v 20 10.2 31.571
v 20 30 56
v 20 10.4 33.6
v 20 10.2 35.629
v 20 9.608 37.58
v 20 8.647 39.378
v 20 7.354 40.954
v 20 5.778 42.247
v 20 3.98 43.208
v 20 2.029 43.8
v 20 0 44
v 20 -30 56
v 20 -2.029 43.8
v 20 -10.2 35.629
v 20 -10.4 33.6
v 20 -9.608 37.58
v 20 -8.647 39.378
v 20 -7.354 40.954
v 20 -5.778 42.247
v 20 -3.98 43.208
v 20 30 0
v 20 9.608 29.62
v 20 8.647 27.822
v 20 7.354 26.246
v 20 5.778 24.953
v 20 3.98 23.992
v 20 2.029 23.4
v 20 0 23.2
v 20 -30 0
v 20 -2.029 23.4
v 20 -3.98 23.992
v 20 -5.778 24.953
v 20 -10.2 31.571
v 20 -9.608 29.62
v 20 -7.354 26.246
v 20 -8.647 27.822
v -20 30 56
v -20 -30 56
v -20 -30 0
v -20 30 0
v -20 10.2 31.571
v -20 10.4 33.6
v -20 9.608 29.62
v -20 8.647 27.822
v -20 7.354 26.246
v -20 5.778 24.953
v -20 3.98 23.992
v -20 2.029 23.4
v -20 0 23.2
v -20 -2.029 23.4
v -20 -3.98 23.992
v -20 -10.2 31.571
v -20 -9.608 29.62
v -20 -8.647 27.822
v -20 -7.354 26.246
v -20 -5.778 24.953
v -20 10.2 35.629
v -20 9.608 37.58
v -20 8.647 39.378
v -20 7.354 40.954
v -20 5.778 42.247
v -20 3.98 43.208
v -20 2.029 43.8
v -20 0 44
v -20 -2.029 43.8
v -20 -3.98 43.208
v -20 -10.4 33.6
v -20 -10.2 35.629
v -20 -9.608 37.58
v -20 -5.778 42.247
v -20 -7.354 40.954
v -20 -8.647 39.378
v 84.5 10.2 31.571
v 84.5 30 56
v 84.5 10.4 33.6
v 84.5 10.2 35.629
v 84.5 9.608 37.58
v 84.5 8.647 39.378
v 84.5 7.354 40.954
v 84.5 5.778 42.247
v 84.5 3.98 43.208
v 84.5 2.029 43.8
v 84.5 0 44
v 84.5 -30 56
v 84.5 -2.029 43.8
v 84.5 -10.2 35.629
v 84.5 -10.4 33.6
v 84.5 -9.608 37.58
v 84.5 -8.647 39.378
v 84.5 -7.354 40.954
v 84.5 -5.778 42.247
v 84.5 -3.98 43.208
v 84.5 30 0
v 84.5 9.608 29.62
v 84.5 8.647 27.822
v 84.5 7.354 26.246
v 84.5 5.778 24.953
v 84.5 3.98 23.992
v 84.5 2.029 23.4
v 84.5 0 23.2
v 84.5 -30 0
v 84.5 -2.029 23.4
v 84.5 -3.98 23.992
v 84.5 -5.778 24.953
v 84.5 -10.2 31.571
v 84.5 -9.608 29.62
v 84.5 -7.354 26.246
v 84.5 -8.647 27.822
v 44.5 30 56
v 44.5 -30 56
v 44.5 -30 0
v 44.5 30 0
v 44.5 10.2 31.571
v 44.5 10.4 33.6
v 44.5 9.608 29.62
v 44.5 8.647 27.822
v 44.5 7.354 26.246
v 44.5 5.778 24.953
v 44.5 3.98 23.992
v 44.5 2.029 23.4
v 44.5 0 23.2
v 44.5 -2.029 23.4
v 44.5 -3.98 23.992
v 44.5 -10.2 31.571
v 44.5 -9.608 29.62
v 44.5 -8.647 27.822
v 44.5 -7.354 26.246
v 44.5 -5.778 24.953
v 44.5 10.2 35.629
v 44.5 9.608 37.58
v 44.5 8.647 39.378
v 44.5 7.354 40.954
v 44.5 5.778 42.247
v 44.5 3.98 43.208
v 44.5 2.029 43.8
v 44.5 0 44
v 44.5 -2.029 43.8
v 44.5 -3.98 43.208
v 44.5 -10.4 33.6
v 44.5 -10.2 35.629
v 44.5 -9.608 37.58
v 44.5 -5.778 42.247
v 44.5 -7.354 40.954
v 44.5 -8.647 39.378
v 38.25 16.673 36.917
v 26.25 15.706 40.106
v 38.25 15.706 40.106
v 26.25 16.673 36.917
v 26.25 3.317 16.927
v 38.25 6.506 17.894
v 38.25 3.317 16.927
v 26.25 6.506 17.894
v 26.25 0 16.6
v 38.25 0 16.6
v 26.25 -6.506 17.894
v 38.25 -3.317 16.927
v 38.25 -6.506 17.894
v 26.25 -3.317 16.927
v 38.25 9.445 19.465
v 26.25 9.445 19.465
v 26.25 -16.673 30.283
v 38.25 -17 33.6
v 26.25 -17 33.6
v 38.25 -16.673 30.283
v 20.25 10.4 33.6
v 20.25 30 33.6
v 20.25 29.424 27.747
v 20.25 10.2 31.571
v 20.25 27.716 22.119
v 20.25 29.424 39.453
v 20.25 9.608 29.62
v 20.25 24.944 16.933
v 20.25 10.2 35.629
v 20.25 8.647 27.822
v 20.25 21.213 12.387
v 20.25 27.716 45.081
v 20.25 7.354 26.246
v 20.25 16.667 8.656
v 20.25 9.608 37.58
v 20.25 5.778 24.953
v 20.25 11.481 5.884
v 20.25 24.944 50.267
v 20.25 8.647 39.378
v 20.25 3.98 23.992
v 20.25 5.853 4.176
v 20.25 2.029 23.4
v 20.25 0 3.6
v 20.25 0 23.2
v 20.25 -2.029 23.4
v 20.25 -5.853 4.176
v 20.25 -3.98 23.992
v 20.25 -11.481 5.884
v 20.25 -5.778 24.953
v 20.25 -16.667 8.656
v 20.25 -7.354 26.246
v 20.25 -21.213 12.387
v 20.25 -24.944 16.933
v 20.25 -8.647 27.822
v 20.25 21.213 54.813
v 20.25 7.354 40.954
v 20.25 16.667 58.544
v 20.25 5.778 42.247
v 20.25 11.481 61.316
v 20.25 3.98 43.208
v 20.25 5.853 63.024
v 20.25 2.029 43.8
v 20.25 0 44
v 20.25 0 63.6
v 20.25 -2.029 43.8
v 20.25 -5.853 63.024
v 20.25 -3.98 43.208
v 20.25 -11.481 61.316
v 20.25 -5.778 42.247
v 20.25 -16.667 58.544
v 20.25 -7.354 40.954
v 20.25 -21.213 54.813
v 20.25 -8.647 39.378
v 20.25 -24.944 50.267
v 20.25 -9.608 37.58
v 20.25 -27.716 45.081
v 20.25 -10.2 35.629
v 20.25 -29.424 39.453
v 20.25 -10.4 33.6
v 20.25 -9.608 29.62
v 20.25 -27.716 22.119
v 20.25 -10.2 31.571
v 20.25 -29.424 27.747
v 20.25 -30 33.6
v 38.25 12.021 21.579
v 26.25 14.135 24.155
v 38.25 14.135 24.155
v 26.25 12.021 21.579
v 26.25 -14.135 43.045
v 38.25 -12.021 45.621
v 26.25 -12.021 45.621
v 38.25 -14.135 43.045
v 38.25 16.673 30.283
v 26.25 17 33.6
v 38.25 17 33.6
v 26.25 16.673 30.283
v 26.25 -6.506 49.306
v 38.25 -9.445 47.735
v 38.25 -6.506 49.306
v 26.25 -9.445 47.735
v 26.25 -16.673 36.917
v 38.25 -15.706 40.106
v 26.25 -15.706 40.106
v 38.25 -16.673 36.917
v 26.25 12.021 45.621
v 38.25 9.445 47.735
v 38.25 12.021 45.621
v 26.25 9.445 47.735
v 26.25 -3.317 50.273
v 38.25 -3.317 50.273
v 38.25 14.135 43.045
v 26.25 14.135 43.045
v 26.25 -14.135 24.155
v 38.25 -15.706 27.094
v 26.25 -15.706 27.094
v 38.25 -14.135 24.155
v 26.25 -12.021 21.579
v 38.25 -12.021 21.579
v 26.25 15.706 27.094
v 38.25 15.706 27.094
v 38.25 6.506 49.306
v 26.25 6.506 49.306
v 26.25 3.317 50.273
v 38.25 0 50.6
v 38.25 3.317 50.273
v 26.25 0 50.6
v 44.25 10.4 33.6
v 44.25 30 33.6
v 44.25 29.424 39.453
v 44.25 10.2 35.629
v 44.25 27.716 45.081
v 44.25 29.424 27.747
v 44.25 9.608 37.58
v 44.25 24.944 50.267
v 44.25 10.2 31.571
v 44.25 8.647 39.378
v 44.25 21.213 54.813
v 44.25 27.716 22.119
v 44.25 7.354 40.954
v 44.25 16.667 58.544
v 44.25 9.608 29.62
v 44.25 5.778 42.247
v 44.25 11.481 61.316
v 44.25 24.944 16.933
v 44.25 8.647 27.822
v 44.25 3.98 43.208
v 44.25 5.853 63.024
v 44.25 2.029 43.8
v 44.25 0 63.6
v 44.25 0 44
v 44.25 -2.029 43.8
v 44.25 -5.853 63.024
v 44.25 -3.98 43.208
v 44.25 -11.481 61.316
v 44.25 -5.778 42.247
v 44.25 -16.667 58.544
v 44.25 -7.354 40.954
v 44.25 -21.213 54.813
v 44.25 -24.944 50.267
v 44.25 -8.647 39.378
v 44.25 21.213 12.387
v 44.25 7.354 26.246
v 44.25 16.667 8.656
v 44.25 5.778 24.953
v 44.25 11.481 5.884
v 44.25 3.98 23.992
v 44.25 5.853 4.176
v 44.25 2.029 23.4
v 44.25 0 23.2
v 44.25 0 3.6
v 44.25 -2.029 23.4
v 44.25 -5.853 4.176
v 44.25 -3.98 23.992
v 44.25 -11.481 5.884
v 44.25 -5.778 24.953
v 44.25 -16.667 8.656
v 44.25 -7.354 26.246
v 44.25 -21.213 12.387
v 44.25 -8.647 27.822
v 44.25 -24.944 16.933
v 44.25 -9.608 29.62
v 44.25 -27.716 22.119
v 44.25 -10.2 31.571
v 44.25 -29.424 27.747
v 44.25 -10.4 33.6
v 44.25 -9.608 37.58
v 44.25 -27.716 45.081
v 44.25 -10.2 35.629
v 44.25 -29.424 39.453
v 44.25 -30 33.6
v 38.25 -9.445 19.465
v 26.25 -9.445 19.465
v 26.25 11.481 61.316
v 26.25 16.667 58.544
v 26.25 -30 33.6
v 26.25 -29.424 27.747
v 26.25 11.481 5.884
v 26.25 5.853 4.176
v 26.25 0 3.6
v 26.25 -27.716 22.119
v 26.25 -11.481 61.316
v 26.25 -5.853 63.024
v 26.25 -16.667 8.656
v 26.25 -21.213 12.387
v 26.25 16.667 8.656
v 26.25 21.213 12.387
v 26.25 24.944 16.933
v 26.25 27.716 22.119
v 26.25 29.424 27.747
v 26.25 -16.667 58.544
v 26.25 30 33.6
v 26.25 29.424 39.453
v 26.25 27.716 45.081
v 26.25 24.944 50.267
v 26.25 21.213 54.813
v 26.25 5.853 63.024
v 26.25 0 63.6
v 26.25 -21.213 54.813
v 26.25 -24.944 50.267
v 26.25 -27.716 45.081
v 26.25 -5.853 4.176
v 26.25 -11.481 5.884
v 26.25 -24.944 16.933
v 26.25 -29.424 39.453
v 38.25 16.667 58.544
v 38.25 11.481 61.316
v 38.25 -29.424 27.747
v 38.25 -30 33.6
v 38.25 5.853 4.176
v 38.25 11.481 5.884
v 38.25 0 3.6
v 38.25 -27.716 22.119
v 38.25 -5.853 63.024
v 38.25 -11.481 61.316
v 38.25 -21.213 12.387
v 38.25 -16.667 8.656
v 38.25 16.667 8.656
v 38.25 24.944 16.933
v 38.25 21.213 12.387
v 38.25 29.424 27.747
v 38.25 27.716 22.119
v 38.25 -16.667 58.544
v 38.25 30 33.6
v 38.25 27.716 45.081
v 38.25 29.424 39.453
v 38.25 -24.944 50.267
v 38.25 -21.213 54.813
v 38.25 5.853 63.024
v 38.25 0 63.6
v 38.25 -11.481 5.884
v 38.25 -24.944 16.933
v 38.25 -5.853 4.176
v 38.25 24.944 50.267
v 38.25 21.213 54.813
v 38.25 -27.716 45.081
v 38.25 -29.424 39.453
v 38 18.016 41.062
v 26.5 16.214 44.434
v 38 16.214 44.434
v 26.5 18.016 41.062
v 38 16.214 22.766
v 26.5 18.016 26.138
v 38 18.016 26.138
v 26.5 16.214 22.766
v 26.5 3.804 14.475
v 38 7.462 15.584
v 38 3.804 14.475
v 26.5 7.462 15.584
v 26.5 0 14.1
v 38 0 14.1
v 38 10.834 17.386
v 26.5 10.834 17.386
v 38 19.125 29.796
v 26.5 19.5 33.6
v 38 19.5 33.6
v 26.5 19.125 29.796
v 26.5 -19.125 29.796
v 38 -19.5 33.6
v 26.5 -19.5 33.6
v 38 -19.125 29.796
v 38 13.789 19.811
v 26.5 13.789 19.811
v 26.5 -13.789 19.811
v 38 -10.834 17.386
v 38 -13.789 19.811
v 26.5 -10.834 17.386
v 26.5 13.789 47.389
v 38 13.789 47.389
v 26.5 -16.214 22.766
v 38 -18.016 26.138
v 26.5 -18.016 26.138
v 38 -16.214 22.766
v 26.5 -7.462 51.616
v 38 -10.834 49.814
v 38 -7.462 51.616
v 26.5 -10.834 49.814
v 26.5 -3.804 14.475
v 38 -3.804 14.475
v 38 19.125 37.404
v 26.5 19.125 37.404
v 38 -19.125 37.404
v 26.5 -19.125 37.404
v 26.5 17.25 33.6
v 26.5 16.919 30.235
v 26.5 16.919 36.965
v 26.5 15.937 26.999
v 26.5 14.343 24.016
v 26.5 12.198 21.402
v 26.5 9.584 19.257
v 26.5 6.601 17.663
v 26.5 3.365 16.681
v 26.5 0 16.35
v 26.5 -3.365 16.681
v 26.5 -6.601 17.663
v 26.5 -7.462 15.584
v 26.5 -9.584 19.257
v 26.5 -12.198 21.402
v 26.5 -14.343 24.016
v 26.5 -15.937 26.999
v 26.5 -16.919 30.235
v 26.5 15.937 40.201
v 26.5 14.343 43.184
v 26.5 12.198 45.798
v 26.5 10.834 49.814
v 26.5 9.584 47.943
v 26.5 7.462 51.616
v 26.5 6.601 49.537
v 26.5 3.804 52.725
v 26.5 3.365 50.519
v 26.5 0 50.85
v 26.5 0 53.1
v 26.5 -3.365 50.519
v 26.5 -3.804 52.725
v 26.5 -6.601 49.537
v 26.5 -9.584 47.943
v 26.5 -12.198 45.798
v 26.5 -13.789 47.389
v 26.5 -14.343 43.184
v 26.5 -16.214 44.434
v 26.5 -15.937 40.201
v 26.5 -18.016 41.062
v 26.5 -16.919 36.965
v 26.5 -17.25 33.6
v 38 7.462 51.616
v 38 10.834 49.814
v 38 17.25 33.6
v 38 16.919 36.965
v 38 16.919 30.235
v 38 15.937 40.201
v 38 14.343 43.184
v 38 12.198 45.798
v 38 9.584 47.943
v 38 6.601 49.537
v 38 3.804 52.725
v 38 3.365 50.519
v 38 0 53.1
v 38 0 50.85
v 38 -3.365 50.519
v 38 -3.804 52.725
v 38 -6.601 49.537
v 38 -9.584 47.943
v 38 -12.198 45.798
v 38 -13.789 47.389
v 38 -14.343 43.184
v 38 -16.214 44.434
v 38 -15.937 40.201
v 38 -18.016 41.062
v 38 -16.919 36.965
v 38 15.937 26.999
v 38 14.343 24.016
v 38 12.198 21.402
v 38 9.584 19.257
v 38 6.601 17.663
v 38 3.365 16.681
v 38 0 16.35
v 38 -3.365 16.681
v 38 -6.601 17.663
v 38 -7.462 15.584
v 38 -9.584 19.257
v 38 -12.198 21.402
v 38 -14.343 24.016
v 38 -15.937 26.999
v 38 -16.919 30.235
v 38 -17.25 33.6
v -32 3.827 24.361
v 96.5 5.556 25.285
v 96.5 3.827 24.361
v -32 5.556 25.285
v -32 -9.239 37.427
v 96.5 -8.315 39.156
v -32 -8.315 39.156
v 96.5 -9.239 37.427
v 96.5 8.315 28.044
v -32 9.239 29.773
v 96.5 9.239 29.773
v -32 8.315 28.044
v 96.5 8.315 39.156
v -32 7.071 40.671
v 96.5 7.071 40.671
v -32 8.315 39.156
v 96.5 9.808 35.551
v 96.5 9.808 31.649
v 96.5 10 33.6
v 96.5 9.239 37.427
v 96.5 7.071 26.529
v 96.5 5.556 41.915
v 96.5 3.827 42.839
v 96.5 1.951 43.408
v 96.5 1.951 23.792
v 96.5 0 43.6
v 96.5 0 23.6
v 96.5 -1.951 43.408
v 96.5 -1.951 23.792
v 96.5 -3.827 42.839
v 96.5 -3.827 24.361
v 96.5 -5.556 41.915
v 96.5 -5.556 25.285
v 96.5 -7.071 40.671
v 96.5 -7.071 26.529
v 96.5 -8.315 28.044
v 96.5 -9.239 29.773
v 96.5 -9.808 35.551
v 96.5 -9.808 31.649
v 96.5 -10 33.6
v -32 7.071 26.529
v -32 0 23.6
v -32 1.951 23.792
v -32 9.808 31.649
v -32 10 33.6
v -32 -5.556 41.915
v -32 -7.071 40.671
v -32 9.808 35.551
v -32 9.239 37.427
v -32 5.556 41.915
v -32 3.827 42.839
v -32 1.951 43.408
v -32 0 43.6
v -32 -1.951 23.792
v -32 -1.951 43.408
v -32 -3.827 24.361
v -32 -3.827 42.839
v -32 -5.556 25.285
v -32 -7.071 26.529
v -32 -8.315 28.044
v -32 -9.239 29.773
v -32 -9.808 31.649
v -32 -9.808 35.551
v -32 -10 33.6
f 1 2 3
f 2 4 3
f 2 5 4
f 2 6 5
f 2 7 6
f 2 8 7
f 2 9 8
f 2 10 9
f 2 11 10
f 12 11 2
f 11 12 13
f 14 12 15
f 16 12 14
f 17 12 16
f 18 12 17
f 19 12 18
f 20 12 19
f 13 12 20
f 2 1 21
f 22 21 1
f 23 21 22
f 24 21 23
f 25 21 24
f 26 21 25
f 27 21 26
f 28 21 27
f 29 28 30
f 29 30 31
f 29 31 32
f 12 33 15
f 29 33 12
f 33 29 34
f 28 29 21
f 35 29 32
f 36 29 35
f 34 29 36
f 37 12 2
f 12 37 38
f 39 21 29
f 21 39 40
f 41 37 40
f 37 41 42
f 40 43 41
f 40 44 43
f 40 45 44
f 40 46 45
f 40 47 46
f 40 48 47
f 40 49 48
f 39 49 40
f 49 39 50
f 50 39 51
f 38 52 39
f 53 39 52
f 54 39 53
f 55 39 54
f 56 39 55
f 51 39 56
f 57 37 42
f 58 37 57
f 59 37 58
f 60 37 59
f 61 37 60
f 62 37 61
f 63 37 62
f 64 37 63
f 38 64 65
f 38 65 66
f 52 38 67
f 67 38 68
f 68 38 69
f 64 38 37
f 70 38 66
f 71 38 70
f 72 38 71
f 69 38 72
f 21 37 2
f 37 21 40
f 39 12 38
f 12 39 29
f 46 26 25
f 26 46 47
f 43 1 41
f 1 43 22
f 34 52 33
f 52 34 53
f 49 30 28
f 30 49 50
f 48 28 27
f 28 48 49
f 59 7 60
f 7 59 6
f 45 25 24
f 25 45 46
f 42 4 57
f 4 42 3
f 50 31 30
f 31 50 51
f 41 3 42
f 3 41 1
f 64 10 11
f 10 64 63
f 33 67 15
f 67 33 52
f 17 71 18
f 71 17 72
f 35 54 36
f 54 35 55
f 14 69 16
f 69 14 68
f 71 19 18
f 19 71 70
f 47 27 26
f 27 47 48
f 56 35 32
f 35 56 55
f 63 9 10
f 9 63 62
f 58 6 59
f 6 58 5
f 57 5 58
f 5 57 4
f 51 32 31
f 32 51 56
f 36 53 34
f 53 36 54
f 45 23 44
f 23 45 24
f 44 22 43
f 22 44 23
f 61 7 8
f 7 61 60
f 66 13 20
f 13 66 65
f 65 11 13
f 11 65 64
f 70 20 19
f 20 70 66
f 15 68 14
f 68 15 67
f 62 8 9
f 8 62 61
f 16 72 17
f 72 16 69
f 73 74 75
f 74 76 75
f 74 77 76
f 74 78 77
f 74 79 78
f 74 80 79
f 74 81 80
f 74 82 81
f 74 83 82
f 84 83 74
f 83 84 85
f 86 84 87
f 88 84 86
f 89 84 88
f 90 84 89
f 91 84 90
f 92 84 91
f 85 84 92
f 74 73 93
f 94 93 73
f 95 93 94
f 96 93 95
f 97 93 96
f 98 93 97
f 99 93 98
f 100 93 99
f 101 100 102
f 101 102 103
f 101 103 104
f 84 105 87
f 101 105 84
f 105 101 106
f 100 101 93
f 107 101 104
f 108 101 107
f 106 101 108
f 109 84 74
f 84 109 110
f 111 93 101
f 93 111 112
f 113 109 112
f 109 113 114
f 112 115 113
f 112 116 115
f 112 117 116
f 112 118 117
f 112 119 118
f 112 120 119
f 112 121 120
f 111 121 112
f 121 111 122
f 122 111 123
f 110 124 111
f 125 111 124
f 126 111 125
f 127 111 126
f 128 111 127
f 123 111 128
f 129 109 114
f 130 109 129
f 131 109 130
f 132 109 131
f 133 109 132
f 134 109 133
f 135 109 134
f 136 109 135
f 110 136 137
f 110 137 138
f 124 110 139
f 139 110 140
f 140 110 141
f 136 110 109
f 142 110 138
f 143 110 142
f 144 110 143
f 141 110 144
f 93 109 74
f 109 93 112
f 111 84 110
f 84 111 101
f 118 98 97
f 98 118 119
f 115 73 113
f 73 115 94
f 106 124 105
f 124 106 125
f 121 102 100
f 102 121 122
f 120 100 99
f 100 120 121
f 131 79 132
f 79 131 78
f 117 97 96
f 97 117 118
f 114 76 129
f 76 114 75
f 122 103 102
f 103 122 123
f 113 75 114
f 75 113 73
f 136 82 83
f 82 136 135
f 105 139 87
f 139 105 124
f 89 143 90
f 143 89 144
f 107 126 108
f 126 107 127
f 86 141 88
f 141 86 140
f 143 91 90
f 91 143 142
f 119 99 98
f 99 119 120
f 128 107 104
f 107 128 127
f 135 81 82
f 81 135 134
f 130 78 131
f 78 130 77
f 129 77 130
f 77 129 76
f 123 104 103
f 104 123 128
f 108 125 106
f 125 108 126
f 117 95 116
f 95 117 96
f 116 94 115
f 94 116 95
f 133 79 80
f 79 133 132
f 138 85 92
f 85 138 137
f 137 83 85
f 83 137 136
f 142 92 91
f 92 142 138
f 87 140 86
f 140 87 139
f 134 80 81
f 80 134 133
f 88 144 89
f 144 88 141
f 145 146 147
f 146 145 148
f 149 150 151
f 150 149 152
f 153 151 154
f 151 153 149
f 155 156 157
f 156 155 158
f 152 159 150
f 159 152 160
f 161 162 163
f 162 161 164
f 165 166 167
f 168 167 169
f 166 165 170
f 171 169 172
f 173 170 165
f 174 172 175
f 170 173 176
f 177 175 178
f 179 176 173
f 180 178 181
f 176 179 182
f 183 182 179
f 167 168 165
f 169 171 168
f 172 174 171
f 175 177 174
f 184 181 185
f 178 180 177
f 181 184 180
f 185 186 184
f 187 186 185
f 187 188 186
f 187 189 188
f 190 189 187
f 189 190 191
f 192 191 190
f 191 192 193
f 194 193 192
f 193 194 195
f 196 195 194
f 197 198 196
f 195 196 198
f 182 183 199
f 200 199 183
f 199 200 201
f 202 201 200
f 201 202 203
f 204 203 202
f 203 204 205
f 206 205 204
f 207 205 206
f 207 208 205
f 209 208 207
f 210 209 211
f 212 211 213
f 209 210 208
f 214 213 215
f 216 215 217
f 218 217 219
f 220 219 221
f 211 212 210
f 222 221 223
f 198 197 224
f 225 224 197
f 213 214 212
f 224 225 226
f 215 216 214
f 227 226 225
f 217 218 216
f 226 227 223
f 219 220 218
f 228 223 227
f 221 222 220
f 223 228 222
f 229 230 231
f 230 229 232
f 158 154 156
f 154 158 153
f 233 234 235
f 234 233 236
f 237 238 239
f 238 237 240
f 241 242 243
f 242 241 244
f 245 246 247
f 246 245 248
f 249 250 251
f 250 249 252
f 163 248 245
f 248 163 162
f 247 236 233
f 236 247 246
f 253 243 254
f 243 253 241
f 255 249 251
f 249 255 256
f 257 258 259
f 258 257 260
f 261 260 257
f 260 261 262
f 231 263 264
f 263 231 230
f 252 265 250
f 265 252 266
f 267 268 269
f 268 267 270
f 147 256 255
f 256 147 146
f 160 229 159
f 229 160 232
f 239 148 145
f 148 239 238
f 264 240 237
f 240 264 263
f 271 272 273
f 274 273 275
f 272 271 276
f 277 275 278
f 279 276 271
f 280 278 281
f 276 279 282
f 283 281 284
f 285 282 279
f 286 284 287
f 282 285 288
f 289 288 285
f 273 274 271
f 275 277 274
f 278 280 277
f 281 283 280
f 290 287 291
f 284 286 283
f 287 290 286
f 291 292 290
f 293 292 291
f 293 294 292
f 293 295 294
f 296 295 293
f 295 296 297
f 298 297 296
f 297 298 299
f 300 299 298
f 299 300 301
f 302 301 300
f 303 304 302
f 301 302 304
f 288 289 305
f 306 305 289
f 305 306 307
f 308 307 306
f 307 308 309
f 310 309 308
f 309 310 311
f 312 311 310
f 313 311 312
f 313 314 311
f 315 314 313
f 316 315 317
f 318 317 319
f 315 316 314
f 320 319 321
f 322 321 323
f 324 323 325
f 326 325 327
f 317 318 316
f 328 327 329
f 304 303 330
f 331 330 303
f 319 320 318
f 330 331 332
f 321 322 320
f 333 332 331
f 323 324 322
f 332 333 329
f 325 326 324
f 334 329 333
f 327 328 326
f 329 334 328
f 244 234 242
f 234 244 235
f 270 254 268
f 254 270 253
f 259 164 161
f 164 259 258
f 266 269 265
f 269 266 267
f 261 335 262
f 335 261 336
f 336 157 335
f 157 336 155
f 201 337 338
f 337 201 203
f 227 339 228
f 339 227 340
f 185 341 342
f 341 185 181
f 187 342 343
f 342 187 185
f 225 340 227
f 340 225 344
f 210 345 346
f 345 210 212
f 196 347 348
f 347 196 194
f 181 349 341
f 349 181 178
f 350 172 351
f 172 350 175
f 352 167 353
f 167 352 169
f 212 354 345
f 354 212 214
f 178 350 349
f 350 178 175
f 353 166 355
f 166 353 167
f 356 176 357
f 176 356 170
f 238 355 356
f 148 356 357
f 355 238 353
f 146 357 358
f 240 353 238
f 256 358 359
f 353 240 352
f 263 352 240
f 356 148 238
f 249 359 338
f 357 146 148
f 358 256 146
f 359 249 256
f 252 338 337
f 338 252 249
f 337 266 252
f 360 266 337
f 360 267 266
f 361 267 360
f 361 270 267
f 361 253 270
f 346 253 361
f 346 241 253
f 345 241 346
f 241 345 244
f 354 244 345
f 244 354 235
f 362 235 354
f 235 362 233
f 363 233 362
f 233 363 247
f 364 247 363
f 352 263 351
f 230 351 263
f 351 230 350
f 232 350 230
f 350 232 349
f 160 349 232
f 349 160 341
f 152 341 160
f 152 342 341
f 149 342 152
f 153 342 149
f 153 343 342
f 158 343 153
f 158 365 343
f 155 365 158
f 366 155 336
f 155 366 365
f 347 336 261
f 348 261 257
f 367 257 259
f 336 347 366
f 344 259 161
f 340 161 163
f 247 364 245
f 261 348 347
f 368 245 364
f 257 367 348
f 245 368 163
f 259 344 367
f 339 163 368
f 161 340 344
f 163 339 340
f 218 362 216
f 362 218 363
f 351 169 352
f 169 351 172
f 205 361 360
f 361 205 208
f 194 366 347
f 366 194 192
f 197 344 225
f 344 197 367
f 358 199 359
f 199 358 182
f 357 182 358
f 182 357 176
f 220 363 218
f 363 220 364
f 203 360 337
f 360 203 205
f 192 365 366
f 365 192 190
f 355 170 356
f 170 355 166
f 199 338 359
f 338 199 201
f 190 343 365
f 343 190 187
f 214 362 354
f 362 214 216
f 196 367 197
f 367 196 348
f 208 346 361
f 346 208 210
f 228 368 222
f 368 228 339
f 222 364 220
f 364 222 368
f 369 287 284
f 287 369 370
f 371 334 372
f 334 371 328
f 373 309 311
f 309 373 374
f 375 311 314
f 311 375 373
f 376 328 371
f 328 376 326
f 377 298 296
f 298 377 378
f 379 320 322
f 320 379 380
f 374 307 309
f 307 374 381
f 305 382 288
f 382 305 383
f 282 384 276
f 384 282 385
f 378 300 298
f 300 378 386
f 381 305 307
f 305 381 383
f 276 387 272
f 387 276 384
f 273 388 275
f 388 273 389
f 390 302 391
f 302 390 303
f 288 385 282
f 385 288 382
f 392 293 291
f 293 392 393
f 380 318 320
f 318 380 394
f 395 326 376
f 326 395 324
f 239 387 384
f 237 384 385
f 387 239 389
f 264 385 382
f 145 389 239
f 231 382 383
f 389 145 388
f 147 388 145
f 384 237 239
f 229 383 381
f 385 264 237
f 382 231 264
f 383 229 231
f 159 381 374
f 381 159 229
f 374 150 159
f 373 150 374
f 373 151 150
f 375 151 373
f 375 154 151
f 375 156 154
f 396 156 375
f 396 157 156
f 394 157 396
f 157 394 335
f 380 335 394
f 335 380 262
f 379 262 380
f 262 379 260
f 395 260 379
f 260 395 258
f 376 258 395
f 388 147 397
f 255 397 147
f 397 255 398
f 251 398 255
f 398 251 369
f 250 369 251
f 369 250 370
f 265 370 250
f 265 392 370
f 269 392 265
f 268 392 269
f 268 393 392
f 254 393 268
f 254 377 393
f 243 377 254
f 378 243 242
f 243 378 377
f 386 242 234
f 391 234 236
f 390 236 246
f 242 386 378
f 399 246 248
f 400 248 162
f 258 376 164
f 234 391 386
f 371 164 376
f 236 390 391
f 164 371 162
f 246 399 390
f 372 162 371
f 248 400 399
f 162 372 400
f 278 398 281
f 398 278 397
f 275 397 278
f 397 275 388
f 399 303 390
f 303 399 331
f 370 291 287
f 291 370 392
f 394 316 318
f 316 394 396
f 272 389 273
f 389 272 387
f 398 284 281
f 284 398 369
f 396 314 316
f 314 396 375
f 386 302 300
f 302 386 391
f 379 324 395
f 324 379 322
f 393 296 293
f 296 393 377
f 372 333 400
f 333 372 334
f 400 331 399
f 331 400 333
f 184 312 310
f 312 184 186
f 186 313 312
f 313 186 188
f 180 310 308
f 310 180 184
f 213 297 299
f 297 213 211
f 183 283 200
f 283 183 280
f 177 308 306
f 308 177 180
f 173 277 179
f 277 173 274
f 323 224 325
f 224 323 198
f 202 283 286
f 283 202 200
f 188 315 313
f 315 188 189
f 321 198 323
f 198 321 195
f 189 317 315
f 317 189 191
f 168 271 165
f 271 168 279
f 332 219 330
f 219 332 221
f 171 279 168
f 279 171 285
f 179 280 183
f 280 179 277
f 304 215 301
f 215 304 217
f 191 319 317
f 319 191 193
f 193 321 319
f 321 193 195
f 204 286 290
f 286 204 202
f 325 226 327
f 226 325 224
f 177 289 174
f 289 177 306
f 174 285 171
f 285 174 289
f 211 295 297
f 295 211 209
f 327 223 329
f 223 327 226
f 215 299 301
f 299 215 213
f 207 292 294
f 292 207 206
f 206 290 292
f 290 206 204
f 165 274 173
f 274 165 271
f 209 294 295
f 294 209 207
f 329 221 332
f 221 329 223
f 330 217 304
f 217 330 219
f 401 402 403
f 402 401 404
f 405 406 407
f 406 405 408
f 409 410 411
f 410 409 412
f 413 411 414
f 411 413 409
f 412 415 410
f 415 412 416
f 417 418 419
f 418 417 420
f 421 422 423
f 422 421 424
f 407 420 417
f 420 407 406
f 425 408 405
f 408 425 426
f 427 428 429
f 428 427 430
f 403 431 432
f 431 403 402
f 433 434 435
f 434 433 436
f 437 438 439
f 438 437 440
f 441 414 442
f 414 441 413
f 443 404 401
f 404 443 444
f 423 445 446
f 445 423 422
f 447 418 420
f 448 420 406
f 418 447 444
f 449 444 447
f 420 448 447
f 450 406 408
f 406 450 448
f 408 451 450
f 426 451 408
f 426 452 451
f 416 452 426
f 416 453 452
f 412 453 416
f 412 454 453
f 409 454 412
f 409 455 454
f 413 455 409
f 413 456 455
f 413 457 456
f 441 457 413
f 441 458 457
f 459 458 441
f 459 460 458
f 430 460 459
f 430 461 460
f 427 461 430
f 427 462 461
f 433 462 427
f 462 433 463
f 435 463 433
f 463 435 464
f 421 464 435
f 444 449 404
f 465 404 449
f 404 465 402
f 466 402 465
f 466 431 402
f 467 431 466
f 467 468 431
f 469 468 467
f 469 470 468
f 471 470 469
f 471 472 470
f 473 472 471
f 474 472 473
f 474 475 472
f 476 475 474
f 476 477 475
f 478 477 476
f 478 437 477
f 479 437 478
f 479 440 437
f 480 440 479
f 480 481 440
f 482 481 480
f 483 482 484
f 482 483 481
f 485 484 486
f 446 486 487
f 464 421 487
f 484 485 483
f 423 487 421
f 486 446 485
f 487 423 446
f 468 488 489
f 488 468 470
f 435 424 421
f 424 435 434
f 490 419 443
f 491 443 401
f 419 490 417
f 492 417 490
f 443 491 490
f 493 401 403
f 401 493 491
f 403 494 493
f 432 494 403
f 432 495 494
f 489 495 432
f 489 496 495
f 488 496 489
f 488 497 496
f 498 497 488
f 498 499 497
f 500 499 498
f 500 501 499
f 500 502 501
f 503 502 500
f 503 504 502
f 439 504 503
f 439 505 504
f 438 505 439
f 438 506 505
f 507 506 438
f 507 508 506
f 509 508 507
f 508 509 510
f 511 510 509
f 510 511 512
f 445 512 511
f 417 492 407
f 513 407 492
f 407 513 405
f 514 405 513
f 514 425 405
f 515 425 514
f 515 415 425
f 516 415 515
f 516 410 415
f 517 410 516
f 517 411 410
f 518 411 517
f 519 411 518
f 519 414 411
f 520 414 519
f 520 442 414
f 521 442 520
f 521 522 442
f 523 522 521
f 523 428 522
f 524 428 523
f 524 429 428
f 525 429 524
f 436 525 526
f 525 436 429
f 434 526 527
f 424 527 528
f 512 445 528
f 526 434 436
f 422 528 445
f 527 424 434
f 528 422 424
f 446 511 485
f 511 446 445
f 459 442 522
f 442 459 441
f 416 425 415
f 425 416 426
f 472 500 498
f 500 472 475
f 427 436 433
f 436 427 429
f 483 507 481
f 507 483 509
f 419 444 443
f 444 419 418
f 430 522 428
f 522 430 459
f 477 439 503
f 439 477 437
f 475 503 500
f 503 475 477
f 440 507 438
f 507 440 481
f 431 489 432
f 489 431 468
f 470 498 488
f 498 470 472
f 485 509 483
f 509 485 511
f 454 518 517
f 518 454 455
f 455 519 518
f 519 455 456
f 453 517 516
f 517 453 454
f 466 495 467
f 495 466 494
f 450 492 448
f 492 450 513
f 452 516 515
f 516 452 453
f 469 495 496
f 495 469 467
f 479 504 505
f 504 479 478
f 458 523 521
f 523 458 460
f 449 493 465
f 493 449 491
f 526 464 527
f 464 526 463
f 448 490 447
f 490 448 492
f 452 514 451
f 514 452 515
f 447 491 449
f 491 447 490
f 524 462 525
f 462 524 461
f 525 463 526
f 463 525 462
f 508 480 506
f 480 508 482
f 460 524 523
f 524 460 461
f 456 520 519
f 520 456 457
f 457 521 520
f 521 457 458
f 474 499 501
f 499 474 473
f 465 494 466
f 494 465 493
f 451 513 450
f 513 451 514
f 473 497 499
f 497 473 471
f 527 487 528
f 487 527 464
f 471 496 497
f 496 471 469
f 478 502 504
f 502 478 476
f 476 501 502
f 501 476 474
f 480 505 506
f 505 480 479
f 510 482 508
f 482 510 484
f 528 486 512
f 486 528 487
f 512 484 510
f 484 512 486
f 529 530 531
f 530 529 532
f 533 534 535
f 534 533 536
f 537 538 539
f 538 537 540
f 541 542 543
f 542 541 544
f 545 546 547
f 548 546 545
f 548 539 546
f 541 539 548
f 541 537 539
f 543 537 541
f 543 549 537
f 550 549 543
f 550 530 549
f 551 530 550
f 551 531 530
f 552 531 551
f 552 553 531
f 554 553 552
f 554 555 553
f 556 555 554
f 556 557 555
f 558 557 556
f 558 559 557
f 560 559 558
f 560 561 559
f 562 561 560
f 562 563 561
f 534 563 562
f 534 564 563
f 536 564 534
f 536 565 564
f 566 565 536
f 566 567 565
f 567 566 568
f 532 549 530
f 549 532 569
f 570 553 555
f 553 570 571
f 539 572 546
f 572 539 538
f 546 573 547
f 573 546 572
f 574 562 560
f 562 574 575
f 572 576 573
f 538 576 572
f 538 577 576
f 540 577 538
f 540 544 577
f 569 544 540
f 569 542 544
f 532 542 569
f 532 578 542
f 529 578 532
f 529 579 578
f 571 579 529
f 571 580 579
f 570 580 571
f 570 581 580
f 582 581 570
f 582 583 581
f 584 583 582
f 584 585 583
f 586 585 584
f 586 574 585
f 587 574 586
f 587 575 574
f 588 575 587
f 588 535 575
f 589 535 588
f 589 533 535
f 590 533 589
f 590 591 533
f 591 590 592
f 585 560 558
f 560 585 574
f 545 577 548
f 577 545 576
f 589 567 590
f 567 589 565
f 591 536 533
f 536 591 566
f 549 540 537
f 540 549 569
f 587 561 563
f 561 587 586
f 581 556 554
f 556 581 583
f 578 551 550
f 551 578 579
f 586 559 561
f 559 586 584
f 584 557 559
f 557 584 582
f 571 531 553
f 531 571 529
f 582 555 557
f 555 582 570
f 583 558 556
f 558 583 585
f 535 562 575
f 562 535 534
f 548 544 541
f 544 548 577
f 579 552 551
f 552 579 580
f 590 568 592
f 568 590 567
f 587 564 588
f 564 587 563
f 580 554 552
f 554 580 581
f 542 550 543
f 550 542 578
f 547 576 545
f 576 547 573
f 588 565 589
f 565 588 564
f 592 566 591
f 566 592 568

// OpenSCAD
$fn = 32;

// ------------------------------------------------------------------------
// Pulley assembly: d60 pulley with a belt, shaft d20
// Every part is its own module, assembly() places them once.
// ------------------------------------------------------------------------

// --- part 1 ---
module support1() {
  difference() {
    translate([-20, -30, 0]) cube([40, 60, 56]);
    translate([0, 0, 33.6]) rotate([0, 90, 0]) cylinder(h = 42, d = 20.8, center = true);
  }
}

// --- part 2 ---
module support2() {
  difference() {
    translate([-20, -30, 0]) cube([40, 60, 56]);
    translate([0, 0, 33.6]) rotate([0, 90, 0]) cylinder(h = 42, d = 20.8, center = true);
  }
}

// --- part 3 ---
module shaft() {
  translate([0, 0, -64.25]) cylinder(h = 128.5, d = 20);
}

// --- part 4 ---
module pulley() {
  difference() {
    union() {
      cylinder(h = 24, d = 34);
      cylinder(h = 6, d = 60);
      translate([0, 0, 18]) cylinder(h = 6, d = 60);
    }
    translate([0, 0, -1]) cylinder(h = 26, d = 20.8);
  }
}

// --- part 5 ---
module belt() {
  difference() {
      translate([0, 0, 0]) cylinder(h = 11.5, d = 39);
      translate([0, 0, -1]) cylinder(h = 13.5, d = 34.5);
    }
}

// --- assembly ---
module assembly() {
  translate([0, 0, 0]) rotate([0, 0, 0]) support1();
  translate([64.5, 0, 0]) rotate([0, 0, 0]) support2();
  translate([32.25, 0, 33.6]) rotate([0, 90, 0]) shaft();
  translate([20.25, 0, 33.6]) rotate([0, 90, 0]) pulley();
  translate([26.5, 0, 33.6]) rotate([0, 90, 0]) belt();
}

assembly();
